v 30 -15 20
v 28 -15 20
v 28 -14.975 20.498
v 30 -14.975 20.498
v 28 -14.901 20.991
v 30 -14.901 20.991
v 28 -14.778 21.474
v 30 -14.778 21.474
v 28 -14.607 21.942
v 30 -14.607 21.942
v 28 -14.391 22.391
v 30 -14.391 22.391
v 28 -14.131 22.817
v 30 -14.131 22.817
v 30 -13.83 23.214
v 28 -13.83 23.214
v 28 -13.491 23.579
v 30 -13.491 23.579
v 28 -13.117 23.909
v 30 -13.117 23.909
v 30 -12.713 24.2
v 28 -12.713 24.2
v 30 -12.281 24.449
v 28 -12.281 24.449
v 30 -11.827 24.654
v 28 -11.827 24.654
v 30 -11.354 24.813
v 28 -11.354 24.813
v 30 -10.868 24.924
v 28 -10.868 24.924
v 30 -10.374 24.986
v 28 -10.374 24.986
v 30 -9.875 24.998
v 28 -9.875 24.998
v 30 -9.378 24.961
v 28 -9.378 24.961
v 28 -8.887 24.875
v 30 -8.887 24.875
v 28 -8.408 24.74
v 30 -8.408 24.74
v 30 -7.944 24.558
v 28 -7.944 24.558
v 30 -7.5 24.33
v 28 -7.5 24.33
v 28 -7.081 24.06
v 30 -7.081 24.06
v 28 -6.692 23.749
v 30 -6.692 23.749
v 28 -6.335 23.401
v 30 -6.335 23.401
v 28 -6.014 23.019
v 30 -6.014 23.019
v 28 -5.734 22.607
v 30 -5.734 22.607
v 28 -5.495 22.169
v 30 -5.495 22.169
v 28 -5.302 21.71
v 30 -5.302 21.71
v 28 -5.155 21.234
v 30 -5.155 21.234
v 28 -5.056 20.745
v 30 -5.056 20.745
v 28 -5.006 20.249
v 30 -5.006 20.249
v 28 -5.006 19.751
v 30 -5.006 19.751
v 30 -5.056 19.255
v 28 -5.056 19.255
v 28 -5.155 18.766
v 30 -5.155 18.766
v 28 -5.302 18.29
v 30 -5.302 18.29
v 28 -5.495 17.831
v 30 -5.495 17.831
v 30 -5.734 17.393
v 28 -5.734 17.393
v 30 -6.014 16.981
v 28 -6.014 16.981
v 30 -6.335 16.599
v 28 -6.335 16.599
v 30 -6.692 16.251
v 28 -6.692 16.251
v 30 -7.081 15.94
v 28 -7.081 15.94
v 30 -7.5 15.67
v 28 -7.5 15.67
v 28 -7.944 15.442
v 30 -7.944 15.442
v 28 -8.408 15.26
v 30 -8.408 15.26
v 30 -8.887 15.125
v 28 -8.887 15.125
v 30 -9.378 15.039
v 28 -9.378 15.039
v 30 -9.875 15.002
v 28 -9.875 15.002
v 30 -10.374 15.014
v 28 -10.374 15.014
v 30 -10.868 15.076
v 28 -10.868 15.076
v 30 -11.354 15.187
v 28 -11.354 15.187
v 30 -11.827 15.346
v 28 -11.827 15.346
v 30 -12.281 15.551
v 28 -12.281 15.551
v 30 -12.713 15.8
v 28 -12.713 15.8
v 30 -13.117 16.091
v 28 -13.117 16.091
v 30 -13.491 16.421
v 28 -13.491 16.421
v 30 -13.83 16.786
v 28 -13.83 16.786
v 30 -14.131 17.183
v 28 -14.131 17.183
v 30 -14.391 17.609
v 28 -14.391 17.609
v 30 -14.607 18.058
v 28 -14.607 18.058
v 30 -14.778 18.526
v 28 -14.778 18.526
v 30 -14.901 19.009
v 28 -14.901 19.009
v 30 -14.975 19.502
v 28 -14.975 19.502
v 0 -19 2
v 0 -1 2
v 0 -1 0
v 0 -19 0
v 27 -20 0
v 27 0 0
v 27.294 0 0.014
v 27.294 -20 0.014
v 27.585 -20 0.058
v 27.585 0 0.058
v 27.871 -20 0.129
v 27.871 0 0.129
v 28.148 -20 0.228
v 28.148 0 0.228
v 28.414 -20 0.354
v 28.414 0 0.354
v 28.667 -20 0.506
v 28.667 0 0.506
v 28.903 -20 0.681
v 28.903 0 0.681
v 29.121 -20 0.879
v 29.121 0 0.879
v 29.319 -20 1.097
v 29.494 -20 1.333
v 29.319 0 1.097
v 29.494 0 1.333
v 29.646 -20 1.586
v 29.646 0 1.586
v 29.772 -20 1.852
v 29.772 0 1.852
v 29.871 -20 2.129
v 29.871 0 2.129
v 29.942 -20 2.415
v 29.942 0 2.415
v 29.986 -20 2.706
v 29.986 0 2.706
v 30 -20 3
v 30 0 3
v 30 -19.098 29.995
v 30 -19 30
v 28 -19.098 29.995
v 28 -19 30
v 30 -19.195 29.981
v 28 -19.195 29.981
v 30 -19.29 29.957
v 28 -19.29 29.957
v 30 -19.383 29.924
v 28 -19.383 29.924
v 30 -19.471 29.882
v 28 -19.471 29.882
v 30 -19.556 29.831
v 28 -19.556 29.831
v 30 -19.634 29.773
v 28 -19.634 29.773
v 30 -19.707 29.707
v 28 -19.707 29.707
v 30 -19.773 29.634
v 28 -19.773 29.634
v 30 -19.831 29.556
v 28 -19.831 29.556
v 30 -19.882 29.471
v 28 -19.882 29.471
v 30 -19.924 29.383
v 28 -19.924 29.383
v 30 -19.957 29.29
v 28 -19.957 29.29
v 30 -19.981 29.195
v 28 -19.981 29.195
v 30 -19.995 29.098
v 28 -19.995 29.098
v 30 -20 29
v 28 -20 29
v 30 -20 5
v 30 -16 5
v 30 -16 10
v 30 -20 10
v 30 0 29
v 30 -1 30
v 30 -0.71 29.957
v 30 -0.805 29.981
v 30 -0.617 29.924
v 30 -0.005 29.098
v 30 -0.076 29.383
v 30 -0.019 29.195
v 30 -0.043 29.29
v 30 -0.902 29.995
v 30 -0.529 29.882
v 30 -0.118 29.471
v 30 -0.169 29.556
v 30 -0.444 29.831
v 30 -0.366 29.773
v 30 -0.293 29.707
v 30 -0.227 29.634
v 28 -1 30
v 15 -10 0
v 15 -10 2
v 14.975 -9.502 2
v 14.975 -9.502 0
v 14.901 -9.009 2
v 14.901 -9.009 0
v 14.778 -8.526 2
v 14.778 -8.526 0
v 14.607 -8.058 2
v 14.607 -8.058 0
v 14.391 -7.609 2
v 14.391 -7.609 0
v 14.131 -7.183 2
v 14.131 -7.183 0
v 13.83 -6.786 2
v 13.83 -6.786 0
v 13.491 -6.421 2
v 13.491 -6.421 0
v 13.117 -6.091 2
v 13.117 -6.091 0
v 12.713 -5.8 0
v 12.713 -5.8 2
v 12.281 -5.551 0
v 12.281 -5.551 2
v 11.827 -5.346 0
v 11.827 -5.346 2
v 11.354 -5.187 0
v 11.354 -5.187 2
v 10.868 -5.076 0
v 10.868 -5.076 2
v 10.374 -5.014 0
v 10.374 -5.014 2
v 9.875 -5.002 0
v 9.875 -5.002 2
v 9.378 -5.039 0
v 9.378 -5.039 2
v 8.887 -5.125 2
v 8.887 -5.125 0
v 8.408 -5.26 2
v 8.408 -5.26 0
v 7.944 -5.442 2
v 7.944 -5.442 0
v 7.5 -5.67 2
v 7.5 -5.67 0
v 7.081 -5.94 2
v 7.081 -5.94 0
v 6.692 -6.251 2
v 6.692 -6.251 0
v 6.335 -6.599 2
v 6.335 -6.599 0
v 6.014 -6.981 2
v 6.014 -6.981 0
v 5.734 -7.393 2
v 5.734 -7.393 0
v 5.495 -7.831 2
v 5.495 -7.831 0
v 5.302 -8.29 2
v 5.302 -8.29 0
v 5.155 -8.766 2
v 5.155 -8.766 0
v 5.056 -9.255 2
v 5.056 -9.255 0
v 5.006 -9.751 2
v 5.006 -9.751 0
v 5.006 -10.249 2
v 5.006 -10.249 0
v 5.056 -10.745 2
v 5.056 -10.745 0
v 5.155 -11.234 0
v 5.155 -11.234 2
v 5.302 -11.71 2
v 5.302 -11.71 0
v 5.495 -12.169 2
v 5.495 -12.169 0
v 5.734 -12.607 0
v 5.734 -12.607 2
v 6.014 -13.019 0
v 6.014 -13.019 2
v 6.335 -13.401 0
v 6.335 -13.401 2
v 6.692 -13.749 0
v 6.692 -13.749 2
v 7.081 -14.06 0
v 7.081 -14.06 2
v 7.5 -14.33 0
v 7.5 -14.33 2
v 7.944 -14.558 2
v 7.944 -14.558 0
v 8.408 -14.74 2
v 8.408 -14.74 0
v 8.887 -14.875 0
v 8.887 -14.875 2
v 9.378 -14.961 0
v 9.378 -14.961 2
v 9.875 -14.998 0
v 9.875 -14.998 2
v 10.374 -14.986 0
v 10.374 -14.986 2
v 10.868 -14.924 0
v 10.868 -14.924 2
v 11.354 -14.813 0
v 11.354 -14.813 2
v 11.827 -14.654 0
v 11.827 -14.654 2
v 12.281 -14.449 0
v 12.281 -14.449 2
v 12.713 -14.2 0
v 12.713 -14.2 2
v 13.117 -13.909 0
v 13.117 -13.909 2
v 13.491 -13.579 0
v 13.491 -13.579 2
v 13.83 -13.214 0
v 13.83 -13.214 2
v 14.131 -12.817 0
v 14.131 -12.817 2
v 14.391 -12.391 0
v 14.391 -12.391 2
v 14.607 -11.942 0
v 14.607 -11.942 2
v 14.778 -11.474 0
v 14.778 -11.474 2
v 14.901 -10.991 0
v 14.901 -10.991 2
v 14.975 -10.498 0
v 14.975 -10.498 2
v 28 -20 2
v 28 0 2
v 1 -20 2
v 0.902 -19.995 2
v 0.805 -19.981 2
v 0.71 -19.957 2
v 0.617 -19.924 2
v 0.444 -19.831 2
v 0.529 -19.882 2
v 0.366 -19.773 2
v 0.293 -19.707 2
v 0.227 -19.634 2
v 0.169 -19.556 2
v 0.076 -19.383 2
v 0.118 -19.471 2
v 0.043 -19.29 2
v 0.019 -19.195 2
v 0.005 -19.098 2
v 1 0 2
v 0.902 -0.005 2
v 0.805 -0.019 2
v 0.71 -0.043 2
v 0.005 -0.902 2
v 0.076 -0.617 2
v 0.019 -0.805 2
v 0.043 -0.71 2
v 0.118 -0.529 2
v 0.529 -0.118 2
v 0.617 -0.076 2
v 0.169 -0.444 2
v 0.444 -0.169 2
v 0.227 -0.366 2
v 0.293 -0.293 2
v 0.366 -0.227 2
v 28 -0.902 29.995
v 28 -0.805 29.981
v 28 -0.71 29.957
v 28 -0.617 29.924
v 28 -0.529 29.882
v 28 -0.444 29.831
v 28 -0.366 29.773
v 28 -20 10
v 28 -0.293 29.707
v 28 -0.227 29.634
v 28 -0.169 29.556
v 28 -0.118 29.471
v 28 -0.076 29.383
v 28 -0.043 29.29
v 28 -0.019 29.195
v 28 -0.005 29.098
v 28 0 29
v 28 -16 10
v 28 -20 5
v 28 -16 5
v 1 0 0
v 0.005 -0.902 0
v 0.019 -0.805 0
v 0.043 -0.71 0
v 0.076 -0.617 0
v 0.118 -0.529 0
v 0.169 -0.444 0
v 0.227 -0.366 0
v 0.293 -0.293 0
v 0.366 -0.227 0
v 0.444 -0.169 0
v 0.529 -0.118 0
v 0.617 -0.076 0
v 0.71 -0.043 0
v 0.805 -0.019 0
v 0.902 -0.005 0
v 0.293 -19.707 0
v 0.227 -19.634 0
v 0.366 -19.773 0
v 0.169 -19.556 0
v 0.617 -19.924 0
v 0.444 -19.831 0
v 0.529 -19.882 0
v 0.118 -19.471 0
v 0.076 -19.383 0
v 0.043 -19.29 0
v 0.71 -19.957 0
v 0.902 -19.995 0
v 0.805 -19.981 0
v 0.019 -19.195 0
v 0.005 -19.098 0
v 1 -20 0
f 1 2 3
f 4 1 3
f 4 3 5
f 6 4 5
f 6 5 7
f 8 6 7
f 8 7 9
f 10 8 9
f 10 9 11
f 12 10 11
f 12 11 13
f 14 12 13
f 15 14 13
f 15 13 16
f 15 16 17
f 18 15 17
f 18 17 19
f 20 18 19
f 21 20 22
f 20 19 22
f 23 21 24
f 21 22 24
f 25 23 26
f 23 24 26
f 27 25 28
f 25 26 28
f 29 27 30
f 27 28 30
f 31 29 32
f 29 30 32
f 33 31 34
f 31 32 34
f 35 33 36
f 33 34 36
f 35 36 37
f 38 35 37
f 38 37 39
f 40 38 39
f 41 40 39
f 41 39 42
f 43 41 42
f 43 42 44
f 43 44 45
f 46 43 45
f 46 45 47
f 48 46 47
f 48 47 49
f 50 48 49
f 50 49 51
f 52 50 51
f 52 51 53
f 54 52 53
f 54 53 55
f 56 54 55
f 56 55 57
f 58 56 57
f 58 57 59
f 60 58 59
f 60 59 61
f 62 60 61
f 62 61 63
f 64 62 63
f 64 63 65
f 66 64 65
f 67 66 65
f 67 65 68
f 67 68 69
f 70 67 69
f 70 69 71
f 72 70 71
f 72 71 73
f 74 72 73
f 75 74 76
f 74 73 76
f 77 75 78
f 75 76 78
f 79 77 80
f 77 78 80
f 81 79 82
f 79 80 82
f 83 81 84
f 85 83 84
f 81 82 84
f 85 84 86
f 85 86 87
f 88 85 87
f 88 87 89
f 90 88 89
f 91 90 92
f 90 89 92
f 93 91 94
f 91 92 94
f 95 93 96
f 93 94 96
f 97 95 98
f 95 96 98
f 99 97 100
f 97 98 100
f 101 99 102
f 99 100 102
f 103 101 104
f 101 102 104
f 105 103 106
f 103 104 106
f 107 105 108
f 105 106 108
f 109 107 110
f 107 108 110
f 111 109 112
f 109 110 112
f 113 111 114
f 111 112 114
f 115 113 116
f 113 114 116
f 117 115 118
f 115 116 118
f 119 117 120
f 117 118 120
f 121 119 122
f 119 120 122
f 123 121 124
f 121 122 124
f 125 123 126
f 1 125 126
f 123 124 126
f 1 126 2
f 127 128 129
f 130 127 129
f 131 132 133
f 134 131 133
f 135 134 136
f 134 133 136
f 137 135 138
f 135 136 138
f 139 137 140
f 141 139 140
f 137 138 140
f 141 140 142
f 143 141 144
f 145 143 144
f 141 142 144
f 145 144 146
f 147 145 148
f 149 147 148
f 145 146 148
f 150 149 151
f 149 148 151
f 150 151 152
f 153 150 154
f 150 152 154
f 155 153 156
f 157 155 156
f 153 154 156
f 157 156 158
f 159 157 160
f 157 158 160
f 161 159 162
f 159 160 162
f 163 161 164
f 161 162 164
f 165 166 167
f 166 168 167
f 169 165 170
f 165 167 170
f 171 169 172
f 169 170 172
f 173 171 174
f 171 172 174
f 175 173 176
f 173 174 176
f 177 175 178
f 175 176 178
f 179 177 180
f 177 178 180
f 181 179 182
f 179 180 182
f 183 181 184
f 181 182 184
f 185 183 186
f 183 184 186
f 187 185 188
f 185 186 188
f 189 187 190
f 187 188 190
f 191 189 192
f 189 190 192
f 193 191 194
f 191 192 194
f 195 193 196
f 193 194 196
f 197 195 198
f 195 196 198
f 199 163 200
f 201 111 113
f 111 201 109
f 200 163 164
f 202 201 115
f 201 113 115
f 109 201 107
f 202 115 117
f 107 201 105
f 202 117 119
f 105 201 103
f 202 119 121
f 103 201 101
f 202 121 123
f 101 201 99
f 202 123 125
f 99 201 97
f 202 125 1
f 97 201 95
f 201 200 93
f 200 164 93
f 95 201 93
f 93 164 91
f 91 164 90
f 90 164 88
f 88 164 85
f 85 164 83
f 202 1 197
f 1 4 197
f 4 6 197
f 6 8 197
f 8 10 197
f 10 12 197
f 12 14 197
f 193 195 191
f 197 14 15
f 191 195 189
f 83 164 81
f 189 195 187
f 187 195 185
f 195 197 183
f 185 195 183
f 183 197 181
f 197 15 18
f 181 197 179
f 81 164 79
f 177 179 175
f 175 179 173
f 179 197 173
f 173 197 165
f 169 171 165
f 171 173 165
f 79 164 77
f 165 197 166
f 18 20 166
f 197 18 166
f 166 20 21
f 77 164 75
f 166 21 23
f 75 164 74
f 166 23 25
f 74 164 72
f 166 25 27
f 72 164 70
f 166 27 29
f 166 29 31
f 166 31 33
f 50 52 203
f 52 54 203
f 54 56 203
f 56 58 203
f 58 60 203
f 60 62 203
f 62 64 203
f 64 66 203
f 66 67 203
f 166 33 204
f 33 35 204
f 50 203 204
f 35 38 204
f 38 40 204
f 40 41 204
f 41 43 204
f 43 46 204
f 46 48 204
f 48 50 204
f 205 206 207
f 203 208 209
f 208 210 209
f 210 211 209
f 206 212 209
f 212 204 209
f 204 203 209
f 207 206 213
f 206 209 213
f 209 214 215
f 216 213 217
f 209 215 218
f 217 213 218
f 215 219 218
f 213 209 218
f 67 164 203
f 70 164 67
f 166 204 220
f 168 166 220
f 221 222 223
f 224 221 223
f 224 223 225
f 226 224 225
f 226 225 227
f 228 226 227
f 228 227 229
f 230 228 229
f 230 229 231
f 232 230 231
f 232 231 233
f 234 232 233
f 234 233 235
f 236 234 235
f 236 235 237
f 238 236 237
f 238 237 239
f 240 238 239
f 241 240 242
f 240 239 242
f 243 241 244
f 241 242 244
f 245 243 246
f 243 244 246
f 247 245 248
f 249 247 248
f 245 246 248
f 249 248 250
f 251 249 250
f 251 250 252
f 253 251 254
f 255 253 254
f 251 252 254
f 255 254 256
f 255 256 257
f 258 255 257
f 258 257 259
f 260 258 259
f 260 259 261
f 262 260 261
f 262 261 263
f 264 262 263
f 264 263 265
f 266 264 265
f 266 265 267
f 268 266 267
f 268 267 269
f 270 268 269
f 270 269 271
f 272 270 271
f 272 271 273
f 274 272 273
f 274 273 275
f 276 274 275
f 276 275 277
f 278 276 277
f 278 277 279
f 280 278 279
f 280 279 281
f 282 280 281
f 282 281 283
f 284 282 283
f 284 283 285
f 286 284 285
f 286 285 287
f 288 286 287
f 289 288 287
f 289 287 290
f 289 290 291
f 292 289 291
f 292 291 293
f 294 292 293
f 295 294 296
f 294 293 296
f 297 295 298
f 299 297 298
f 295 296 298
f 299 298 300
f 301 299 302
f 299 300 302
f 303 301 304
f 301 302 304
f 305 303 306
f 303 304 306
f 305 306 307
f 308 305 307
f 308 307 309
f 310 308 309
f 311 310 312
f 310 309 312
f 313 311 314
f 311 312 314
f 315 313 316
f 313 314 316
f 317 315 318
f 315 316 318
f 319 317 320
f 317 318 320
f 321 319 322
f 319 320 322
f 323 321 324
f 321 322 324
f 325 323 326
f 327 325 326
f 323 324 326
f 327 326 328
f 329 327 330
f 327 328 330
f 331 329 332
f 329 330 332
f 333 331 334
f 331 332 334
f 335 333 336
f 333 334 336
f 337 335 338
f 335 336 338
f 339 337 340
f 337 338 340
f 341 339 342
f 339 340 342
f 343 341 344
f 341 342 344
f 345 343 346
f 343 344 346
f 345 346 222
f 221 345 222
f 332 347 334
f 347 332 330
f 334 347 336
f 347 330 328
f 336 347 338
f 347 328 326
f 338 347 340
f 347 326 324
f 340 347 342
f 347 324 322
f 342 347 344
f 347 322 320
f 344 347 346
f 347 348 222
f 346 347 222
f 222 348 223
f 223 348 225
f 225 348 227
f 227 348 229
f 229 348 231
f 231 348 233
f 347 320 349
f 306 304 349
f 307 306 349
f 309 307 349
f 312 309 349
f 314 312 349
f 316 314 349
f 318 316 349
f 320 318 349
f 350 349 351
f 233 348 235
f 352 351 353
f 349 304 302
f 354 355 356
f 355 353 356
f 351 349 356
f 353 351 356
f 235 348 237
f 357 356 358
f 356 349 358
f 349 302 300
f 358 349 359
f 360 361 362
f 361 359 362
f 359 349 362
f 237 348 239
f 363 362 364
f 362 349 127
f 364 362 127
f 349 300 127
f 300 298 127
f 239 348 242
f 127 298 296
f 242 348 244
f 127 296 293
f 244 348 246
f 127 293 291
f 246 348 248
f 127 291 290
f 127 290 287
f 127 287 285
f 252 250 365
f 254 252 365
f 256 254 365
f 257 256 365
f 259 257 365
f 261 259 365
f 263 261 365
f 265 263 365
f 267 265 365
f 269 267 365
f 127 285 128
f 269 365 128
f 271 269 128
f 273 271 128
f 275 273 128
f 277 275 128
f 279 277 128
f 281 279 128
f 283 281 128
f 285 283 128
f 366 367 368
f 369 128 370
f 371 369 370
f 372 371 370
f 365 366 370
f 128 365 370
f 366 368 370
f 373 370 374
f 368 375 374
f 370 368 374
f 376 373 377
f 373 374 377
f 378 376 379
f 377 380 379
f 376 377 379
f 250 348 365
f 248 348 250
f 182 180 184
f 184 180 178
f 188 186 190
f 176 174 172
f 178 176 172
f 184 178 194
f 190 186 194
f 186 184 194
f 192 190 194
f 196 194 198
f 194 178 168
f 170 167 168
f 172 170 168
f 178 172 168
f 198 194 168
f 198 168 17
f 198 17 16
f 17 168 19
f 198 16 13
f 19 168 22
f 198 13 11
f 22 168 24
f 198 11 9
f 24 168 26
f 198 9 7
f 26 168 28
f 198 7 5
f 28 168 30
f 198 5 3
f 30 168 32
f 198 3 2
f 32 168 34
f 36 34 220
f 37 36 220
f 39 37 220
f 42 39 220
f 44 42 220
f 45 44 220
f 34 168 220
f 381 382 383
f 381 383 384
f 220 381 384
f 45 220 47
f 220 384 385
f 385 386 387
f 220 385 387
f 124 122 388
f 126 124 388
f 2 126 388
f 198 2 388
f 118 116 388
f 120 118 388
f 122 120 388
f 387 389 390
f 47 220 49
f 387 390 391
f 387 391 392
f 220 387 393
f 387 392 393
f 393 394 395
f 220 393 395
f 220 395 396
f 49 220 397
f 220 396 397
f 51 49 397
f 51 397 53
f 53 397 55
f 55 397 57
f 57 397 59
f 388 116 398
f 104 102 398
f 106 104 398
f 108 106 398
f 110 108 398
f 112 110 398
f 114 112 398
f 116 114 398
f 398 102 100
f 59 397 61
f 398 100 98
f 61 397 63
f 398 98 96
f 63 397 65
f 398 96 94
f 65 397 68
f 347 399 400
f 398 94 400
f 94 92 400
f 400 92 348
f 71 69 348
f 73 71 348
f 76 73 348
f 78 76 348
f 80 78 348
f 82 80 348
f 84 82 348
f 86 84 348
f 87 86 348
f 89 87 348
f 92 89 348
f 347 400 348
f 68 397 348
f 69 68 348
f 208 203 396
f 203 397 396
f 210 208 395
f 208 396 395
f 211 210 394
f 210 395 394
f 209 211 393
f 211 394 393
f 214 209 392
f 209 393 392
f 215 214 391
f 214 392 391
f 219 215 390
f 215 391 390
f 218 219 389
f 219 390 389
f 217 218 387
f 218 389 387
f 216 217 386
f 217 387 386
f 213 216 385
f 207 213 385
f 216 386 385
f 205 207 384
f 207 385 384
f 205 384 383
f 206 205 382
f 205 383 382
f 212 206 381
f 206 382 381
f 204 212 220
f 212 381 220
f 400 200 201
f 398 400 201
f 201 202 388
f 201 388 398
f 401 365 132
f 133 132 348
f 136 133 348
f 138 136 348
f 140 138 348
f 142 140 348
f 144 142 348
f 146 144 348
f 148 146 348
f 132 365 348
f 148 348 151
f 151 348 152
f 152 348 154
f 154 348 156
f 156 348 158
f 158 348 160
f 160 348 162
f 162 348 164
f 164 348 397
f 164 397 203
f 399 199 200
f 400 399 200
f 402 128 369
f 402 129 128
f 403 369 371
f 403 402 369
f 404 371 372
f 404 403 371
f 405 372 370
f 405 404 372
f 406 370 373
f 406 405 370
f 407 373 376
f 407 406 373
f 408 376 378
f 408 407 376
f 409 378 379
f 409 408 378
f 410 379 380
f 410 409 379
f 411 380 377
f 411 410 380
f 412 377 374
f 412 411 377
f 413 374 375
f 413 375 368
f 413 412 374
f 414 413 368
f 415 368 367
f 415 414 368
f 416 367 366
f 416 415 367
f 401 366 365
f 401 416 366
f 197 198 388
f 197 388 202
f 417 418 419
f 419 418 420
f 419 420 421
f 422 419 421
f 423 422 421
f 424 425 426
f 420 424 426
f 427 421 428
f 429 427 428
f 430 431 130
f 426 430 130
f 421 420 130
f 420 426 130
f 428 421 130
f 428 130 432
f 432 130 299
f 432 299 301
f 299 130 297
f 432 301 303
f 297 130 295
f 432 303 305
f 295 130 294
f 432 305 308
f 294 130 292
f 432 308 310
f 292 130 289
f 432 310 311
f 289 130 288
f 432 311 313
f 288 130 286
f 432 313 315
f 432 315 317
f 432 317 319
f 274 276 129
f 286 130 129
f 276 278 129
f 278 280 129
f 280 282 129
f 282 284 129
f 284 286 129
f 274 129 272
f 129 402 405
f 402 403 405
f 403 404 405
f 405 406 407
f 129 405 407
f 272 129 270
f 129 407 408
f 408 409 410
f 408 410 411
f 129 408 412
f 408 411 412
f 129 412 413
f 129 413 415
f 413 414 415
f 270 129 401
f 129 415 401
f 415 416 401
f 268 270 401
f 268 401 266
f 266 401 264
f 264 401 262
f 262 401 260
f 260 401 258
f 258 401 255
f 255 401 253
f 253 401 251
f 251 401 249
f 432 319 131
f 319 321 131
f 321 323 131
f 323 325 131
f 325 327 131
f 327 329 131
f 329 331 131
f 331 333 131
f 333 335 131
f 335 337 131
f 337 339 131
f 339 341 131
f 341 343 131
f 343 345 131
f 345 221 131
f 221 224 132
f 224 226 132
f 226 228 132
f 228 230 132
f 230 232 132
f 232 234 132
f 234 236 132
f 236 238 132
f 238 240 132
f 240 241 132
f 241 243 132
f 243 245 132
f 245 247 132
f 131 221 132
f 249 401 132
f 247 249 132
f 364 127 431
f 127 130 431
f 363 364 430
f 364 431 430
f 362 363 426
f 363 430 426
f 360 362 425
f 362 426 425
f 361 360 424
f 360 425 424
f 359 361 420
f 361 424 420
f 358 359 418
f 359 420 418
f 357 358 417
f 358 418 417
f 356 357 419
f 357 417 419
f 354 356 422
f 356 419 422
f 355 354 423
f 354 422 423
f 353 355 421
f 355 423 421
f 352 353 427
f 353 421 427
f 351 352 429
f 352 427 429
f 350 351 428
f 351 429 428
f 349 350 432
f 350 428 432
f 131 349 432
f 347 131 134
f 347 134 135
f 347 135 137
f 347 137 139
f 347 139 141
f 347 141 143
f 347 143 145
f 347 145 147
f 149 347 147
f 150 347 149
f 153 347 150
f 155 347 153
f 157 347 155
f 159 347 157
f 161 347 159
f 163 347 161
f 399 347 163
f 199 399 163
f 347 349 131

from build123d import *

# Parameters (mm, degrees)
F1_DEPTH = 20
F2_R     = 5
F3_DEPTH = 2.001
F4_R     = 5
F5_DEPTH = 2.001
F6_W     = 4
F6_H     = 5
F7_DEPTH = 30.001
F8_R     = 1


with BuildPart() as f1:
    # F0 (on Front) → F1 (new body)
    with BuildSketch(Plane.XZ):
        with BuildLine():
            Line((0, 2), (0, 0))
            Line((0, 0), (27, 0))
            ThreePointArc((27, 0), (29.12132, 0.87868), (30, 3))
            Line((30, 3), (30, 30))
            Line((30, 30), (28, 30))
            Line((28, 30), (28, 2))
            Line((28, 2), (0, 2))
        make_face()
    extrude(amount=F1_DEPTH)

    # F2 (on face) → F3 (cut, through all)
    with BuildSketch(Plane(origin=(28, 0, 0), x_dir=(0, -1, 0), z_dir=(-1, 0, 0))):
        with Locations((10, 20)):
            Circle(F2_R)
    extrude(amount=-F3_DEPTH, mode=Mode.SUBTRACT)

    # F4 (on face) → F5 (cut, through all)
    with BuildSketch(Plane.XY.offset(2)):
        with Locations((10, -10)):
            Circle(F4_R)
    extrude(amount=-F5_DEPTH, mode=Mode.SUBTRACT)

    # F6 (on face) → F7 (cut, through all)
    with BuildSketch(Plane.YZ.offset(30)):
        with Locations((-18, 7.5)):
            Rectangle(F6_W, F6_H)
    extrude(amount=-F7_DEPTH, mode=Mode.SUBTRACT)

    # F8
    f8_edges = [f1.edges().sort_by_distance(p)[0] for p in [
        (0, -20, 1),
        (0, 0, 1),
        (29, 0, 30),
        (29, -20, 30),
    ]]
    fillet(f8_edges, radius=F8_R)


solid = f1.part
